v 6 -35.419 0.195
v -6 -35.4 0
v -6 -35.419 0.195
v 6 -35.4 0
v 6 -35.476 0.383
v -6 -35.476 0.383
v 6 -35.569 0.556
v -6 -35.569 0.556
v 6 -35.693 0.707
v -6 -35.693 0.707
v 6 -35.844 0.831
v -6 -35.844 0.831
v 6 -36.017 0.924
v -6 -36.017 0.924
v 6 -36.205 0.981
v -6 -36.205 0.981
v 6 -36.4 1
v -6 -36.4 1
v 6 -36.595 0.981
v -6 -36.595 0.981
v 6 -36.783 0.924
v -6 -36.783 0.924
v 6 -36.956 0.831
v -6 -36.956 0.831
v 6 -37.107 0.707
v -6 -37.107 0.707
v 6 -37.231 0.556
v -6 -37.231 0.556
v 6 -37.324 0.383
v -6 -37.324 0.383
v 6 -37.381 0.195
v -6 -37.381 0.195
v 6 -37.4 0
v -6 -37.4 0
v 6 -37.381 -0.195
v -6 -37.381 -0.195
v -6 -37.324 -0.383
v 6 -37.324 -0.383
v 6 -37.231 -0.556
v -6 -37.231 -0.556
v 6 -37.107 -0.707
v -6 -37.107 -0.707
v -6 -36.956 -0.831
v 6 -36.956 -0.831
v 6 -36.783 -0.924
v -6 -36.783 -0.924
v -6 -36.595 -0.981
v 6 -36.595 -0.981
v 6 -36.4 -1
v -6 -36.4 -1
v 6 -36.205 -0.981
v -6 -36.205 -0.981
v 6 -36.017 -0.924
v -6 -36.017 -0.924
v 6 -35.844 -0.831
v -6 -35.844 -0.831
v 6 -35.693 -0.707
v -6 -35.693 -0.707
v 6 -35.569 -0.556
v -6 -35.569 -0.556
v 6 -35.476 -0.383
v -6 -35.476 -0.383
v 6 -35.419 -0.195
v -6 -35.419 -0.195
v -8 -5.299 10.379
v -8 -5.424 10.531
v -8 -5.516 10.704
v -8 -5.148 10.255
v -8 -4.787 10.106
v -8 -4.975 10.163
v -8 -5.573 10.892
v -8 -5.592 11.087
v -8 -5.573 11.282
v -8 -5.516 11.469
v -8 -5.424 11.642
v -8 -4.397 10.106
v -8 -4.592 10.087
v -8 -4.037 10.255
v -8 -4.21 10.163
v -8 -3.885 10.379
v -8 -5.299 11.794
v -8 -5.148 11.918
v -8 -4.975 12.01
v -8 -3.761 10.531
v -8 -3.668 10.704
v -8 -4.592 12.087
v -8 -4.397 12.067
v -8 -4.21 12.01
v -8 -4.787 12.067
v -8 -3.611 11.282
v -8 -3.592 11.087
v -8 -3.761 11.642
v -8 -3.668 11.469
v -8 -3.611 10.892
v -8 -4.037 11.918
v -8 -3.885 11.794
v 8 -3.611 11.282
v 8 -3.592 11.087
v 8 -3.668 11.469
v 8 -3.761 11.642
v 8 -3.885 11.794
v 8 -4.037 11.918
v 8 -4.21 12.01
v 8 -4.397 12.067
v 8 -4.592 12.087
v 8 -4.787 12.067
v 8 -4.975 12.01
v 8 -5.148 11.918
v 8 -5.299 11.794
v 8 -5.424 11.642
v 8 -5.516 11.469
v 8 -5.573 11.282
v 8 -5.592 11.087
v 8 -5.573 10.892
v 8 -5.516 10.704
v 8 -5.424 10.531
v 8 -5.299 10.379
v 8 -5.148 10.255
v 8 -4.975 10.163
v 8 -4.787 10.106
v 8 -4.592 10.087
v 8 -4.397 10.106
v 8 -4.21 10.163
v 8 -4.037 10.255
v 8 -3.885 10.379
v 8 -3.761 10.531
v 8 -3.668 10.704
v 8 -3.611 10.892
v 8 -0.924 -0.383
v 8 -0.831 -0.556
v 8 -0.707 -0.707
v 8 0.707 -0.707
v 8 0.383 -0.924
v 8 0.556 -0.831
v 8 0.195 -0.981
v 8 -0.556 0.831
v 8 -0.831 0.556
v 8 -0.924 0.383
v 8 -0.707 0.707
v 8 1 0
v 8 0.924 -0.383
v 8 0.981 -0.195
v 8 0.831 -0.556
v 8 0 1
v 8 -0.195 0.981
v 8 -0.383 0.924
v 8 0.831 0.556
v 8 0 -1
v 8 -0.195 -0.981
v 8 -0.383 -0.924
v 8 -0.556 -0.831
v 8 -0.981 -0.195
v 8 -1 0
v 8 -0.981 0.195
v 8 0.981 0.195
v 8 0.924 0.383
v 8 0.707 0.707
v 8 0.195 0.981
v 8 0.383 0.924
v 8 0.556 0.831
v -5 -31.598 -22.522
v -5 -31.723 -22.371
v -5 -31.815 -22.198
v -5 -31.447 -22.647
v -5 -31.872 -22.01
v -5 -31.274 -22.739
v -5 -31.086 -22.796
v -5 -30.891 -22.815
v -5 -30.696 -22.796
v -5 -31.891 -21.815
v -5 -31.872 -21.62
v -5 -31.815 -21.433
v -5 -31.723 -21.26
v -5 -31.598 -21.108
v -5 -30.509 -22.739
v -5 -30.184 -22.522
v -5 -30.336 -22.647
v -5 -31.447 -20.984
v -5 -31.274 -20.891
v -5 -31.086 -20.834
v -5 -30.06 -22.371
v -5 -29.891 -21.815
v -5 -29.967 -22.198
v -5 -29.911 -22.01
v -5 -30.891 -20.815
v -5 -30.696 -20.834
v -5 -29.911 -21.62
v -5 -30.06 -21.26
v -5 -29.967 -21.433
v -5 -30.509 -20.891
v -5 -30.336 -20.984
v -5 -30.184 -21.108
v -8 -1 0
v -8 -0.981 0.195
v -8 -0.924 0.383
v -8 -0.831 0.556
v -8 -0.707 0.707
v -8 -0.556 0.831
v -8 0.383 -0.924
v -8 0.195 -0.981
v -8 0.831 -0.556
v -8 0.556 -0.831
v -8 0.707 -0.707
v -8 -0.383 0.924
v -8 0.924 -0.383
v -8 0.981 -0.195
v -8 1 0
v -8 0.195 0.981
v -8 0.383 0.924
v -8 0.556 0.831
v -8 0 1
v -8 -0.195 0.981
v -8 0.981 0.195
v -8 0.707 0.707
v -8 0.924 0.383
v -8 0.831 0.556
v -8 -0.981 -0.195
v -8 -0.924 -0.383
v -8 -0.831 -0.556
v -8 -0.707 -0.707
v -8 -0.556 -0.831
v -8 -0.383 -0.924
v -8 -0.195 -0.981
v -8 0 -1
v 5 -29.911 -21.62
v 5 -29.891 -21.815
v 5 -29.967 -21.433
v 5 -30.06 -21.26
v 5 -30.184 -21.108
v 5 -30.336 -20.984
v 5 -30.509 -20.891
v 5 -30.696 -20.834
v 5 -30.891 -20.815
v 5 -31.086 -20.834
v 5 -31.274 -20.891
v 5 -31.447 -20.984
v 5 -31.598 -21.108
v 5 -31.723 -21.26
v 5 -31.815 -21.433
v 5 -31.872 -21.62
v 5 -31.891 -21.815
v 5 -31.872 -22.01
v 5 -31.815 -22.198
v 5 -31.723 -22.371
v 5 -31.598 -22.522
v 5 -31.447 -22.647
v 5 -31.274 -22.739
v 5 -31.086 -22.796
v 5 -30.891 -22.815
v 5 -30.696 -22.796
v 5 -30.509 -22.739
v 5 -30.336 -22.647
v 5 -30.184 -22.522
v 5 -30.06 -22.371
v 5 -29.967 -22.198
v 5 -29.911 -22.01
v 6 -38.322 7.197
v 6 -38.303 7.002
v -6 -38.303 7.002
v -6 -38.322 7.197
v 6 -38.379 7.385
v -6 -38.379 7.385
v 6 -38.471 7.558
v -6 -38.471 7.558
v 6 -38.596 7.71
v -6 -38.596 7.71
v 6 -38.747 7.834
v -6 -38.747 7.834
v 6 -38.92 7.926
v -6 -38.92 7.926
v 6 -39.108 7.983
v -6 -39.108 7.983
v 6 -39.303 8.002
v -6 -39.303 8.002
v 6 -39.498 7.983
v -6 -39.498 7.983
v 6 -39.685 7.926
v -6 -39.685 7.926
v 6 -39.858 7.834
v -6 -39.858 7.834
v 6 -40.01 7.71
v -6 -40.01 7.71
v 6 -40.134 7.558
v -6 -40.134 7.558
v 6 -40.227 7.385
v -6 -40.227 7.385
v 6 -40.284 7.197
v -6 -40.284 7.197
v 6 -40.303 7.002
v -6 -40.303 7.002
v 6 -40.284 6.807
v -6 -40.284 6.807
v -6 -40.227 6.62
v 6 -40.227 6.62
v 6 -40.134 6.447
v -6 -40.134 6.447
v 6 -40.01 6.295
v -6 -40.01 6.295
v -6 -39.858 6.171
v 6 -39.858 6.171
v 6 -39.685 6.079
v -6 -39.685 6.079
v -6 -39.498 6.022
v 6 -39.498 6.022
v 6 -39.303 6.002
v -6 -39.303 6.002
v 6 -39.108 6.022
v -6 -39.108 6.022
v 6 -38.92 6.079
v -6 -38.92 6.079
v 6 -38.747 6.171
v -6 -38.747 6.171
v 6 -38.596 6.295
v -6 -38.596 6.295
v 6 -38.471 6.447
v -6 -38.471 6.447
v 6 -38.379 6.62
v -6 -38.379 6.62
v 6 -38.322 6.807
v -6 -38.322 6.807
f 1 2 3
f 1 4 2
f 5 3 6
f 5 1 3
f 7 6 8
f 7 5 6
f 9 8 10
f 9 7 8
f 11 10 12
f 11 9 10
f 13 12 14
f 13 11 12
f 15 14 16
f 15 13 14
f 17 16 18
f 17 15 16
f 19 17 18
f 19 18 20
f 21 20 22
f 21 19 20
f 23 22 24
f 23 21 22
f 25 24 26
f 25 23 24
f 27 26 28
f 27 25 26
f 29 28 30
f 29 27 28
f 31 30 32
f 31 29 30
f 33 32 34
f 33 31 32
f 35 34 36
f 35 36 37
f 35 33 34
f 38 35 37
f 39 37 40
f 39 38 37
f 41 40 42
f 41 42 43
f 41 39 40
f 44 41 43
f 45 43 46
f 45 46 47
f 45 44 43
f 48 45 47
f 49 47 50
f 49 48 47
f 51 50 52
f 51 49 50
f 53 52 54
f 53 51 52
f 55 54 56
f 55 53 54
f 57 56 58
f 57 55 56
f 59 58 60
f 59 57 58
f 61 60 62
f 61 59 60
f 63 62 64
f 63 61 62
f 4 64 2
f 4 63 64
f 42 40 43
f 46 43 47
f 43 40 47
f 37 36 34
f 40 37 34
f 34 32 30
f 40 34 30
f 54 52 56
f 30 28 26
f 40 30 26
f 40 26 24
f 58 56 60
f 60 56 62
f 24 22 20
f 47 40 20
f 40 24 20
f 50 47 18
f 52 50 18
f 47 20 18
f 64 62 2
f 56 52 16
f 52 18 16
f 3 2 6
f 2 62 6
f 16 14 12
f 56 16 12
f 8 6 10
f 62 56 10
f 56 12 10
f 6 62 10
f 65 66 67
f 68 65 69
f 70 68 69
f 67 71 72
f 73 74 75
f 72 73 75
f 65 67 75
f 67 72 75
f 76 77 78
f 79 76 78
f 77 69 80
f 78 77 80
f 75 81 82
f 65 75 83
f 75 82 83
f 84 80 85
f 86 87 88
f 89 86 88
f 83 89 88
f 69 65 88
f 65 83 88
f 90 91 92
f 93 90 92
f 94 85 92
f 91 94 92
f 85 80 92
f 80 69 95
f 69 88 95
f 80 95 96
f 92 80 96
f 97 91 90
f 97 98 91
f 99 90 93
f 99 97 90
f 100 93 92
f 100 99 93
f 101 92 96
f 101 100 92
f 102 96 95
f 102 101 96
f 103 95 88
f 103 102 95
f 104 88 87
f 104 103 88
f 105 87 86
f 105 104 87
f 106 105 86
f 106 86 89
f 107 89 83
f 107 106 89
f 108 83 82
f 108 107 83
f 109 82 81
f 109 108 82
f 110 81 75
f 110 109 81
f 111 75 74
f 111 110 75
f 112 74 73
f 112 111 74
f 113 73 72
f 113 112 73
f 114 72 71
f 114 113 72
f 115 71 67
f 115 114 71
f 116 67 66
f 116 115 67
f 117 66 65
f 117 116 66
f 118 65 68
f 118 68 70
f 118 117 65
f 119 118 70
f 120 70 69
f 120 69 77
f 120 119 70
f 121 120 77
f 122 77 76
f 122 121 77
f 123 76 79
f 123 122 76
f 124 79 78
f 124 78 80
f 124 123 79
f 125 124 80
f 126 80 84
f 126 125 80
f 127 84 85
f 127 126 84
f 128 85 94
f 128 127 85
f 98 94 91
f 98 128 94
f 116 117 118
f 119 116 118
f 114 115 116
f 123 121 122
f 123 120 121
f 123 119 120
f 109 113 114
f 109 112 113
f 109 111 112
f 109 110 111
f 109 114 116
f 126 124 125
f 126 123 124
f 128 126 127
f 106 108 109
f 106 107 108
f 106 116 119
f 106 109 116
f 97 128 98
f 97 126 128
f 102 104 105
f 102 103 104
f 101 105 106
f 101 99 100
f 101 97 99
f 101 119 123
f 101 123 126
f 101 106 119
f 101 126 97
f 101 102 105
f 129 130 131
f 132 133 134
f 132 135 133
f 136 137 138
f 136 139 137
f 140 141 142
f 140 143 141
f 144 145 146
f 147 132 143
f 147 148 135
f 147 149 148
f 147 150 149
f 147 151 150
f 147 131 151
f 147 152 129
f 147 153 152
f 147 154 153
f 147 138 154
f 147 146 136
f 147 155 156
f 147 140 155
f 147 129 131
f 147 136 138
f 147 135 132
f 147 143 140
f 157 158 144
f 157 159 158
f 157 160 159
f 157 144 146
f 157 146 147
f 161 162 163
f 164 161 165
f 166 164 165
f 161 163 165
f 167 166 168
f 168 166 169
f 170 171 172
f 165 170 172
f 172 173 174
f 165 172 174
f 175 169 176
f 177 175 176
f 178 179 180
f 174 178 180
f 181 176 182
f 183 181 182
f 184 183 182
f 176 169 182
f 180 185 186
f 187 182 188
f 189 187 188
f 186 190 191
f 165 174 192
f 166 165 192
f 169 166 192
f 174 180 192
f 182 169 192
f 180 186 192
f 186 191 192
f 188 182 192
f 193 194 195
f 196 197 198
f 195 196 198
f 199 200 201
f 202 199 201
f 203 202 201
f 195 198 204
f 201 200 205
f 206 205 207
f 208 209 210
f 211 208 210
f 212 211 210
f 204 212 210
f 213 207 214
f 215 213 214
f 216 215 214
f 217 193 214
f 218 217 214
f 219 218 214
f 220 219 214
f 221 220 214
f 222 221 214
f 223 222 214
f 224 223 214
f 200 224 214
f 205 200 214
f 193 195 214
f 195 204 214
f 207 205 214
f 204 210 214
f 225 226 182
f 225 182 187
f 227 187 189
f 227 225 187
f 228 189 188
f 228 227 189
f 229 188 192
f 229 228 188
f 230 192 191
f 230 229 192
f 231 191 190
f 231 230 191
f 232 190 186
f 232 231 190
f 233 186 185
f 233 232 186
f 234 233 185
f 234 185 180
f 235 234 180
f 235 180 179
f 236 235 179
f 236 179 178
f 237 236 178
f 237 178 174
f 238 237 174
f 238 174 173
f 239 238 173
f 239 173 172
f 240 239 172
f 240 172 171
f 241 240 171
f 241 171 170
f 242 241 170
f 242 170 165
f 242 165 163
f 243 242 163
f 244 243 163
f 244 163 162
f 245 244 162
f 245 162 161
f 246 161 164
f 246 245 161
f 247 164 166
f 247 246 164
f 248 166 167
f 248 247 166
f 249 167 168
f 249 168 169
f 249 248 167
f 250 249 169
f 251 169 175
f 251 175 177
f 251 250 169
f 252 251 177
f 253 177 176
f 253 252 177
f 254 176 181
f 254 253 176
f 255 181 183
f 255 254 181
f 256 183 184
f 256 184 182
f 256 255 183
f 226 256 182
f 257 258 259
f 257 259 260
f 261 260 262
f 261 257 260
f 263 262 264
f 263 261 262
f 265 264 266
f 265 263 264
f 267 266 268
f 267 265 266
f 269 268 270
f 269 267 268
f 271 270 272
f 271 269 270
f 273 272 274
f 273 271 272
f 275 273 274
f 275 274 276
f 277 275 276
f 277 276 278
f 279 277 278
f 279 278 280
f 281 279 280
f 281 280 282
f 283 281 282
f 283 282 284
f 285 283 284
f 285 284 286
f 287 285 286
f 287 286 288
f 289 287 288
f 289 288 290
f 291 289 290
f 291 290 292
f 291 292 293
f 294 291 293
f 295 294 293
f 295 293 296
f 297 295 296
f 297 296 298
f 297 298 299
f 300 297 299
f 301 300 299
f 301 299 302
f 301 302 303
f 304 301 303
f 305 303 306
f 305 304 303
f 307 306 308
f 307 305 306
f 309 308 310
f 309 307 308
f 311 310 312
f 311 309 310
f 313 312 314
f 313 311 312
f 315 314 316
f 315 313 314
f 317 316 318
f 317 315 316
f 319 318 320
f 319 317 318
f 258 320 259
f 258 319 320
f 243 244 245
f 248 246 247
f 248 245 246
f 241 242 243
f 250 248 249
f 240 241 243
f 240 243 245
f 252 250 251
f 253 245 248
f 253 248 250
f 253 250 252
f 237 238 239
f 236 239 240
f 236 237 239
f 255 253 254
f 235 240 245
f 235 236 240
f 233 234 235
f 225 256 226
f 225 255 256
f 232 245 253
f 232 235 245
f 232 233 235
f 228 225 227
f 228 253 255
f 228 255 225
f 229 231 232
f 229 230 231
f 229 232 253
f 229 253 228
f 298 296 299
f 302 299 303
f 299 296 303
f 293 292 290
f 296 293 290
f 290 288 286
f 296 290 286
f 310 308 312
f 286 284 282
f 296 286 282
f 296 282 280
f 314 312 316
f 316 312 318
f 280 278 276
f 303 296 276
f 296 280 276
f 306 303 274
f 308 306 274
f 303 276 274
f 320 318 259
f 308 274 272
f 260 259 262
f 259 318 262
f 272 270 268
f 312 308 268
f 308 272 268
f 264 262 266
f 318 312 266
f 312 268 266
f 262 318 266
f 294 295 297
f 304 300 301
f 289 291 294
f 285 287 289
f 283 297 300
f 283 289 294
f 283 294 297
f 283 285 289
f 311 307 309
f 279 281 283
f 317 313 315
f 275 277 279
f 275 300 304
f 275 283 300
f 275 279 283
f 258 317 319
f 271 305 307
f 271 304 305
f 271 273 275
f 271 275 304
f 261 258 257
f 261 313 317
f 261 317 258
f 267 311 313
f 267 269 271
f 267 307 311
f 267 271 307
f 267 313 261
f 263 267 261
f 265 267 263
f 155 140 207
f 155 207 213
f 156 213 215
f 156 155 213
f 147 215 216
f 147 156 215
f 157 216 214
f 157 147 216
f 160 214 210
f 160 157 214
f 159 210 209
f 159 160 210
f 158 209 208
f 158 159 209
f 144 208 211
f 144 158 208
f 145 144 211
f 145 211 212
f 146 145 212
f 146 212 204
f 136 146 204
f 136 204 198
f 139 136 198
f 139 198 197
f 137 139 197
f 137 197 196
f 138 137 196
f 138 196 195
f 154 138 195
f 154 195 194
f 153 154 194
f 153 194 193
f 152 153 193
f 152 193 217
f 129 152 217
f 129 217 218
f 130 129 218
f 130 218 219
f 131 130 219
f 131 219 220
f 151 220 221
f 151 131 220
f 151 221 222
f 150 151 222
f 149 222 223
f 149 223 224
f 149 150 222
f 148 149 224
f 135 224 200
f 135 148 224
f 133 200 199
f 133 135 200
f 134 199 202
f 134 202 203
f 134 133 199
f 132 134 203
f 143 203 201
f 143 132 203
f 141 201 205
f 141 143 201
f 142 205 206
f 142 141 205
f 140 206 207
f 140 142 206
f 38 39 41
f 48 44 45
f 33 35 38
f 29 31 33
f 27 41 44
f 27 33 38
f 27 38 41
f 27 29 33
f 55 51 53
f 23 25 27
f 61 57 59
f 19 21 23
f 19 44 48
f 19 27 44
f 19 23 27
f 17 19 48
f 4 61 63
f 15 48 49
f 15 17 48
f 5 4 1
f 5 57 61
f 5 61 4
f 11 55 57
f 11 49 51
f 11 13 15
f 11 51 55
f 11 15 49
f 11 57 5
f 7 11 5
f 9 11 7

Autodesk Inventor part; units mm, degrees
sketch "スケッチ1" plane through (0, 0, 0) normal (1, 0, 0) x (0, 1, 0)
  circle A0 centre (0, 0) radius 1
  circle A1 centre (-36.4, 0) radius 1
  circle A2 centre (-30.8913, -21.8152) radius 1
  line L0 (-36.4, 0) -> (0, 0)
  line L1 (-30.8913, -21.8152) -> (-36.4, 0)
  line L2 (0, 0) -> (0, 70.9009)
  circle A3 centre (-4.5922, 11.0866) radius 1
  circle A4 centre (-39.3028, 7.0024) radius 1
  line L3 (0, 0) -> (-4.5922, 11.0866)
  line L4 (-39.3028, 7.0024) -> (-36.4, 0)
  line L5 (-39.3028, 7.0024) -> (-4.5922, 11.0866)
  line L6 (-48.5633, 0) -> (9.2606, 0) projected
  line L7 (-39.3028, 7.0024) -> (-38.2362, 7.2717)
  line L8 (-36.4, 0) -> (-38.2362, 7.2717)
  line L9 (0, 0) -> (0, 28.7676)
  dimension "d0" = 2
  dimension "d1" = 2
  dimension "d2" = 2
  dimension "d3" = 36.4
  dimension "d4" = 22.5
  dimension "d5" = 90
  dimension "d9" = 2
  dimension "d10" = 2
  dimension "d13" = 12
  dimension "d15" = 34.95
  dimension "d23" = 1.1
  dimension "d24" = 7.5
  dimension "d29" = 90
  dimension "d30" = 22.5
extrude "押し出し1" add sketch "スケッチ1" along normal mid plane 10 contours L6 L2 A0 | A0 L0 L6 | L2 L3 A0 | A0 L3 L0 | L0 L8 A1 | A1 L1 L0 | L3 L5 A3 | A3 L5 L3 | L8 L4 A1 | A1 L6 L1 | L6 A1 L4 | L4 L5 A4 | A4 L7 L4 | L5 L7 A4 | A2
move faces "移動1" translate (3, 0, 0) faces at (5, -5.0742, 10.9876) (5, 0.5848, -0.397) (3.3333, 0.9871, -0.1604) (-3.3333, 0.9871, -0.1604)
move faces "移動2" translate (-3, 0, 0) faces at (-5, -5.0742, 10.9876) (-5, 0.5848, -0.397)
move faces "移動3" translate (1, 0, 0) faces at (5, -39.7818, 6.7248) (5, -36.7299, -0.221)
move faces "移動4" translate (-1, 0, 0) faces at (-5, -39.7818, 6.7248) (-5, -36.7299, -0.221)
properties part number "HbIndexPosture_flex01"
